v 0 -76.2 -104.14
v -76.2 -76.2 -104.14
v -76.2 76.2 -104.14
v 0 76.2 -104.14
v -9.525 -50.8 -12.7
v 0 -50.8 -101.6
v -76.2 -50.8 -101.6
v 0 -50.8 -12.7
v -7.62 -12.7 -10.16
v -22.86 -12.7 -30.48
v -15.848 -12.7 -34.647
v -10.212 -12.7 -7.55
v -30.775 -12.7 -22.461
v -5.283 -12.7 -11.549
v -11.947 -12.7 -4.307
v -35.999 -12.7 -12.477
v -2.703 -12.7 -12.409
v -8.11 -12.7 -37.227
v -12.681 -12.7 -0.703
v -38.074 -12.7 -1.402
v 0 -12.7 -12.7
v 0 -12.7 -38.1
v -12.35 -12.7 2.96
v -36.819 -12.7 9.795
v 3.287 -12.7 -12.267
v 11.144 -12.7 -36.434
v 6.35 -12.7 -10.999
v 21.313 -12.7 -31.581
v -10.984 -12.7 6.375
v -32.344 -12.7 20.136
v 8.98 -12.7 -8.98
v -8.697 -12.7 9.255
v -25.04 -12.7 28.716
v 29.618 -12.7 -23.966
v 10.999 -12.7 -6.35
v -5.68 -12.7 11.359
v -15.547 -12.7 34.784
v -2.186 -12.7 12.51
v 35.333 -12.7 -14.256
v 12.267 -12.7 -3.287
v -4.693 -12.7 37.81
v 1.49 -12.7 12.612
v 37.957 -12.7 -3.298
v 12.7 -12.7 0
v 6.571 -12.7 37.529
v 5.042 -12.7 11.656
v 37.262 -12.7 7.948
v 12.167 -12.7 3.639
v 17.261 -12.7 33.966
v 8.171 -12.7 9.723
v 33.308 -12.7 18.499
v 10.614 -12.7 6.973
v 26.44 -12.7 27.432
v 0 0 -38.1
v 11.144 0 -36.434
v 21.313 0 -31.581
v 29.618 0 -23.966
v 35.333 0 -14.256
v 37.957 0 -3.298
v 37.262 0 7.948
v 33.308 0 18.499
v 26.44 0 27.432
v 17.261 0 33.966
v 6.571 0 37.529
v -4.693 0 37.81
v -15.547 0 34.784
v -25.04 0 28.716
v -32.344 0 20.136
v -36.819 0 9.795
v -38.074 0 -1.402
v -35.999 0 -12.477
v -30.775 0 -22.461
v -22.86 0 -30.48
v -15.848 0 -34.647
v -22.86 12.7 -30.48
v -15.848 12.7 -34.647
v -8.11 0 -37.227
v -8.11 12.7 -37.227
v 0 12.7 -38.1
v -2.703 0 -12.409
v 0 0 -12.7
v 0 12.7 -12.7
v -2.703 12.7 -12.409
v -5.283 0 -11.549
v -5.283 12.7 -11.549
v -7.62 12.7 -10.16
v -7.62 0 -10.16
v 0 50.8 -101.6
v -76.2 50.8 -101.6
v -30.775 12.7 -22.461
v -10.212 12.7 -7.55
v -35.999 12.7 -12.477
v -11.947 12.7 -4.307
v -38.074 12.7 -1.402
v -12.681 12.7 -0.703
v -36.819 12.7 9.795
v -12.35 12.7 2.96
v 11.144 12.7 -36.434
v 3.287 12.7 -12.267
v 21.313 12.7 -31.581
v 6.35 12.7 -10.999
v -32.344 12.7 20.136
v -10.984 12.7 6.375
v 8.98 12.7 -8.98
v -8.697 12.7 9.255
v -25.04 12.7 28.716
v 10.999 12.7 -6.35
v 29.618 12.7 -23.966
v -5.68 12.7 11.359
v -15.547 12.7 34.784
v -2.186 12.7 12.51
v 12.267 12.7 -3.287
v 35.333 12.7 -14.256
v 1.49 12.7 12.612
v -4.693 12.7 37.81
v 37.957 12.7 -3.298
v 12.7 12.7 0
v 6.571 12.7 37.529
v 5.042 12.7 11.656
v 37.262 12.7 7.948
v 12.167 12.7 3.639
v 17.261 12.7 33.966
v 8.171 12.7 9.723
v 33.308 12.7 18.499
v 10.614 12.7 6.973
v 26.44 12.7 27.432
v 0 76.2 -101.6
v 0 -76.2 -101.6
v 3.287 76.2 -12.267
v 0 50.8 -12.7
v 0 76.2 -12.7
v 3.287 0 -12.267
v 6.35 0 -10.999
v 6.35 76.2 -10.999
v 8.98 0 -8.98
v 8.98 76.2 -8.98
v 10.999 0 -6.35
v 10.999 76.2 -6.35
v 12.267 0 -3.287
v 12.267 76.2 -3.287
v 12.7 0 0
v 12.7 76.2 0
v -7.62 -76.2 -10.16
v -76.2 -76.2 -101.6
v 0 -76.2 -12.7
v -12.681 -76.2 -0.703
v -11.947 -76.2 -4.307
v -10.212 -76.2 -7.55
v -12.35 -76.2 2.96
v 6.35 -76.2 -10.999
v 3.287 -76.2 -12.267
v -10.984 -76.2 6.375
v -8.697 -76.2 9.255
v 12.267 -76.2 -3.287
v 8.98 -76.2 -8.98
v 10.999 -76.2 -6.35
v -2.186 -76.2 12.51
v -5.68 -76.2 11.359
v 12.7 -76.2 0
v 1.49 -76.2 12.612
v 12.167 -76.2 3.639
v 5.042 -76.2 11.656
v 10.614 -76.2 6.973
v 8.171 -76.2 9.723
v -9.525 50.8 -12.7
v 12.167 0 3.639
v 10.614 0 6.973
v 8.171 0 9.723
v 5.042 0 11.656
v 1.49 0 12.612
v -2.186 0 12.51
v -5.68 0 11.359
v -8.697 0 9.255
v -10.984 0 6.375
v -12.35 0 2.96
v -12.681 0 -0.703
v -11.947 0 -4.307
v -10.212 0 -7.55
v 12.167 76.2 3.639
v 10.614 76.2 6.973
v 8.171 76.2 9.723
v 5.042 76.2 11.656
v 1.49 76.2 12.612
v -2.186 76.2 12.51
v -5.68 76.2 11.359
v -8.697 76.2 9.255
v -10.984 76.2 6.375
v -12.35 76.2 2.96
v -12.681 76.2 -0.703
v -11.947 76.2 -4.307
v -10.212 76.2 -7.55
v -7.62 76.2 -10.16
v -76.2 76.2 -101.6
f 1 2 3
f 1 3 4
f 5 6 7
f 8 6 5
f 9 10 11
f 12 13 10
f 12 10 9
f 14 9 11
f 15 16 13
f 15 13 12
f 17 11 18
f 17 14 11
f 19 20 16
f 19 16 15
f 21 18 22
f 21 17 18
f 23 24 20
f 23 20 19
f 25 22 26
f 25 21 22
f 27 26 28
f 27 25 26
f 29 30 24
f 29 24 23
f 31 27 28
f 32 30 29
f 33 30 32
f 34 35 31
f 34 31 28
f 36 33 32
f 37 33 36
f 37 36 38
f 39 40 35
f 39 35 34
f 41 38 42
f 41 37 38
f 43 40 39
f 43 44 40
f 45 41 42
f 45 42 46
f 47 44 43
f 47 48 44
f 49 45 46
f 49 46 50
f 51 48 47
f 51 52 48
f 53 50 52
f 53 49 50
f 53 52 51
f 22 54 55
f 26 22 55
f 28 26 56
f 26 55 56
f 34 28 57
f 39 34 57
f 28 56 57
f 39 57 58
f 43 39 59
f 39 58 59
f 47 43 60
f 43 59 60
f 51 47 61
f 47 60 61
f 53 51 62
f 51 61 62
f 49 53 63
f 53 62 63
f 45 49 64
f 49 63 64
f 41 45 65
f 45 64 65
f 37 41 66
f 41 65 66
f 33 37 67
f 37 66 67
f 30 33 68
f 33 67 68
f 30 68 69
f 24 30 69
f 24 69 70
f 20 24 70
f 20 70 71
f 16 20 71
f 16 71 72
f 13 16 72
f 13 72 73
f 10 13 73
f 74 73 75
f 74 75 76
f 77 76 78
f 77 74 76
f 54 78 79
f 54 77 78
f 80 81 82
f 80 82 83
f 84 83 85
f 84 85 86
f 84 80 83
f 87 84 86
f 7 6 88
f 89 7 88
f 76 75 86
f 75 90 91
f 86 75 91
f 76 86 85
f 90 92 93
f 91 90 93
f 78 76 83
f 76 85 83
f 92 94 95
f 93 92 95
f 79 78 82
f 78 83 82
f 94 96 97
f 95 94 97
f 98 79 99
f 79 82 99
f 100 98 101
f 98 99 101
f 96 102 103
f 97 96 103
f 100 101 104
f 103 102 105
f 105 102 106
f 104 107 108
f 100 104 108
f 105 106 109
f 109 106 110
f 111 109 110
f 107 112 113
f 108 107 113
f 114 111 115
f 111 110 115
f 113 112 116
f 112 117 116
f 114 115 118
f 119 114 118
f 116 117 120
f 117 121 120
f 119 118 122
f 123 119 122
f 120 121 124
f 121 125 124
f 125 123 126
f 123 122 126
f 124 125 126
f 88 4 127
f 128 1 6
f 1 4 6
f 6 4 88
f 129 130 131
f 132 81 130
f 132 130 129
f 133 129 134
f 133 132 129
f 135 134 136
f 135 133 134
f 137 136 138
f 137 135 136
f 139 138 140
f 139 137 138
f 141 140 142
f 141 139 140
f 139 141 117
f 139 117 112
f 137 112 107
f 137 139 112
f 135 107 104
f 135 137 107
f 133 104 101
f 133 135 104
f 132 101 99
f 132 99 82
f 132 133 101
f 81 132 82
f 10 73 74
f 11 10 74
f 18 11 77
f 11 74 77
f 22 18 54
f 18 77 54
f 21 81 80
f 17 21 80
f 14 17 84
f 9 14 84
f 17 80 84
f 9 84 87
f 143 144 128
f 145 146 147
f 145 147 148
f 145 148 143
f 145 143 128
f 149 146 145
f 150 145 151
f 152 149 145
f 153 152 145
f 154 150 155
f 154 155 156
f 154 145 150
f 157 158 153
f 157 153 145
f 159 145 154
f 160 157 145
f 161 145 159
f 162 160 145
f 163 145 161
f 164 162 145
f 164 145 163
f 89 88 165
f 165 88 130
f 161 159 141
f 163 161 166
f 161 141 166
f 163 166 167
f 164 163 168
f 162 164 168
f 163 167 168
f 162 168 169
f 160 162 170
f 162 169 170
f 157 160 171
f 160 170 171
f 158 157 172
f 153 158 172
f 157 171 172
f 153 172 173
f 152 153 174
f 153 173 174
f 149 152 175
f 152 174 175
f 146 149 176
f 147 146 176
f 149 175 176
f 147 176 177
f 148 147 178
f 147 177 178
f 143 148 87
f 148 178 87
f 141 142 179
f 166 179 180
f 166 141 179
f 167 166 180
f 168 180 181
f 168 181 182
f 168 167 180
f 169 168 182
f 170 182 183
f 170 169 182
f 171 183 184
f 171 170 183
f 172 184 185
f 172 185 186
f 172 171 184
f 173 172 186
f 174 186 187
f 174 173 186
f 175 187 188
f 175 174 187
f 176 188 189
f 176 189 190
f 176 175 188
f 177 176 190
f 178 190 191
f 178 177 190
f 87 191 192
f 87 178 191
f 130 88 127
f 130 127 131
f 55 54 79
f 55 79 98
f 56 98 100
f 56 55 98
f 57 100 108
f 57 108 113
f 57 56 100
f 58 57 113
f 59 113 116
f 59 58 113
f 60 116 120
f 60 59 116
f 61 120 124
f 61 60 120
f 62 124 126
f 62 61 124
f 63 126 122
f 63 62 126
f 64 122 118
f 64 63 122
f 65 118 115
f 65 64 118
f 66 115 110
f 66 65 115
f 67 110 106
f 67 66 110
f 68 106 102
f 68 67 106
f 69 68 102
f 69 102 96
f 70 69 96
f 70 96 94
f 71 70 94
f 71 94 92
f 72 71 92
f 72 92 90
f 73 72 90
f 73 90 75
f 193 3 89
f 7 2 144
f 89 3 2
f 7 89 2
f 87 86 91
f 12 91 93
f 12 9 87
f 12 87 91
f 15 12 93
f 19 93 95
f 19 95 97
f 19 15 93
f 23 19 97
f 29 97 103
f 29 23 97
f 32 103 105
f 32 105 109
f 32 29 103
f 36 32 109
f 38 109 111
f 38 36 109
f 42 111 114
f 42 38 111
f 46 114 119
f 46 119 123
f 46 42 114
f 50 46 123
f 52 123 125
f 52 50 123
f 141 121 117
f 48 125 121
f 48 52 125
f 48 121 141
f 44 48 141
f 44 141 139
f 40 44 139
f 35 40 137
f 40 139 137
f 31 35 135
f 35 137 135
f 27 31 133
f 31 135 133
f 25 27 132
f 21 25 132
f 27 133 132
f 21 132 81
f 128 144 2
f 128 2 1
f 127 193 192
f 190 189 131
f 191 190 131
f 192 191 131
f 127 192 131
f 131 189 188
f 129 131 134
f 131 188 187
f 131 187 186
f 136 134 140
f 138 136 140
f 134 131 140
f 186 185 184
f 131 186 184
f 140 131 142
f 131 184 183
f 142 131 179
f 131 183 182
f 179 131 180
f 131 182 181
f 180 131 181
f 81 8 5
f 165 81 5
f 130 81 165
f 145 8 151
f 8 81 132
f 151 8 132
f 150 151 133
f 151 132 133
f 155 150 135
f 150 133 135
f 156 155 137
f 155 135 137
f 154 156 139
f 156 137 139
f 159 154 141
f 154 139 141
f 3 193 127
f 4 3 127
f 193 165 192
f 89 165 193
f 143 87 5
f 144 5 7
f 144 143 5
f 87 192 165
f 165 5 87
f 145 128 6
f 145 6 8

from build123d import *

# Parameters (mm, degrees)
F0_W     = 76.2
F0_H     = 2.54
F1_DEPTH = 76.2
F2_DEPTH = 76.2
F3_W     = 101.6
F3_H     = 88.9
F4_DEPTH = 76.201
F5_DEPTH = 12.7


with BuildPart() as f1:
    # F0 (on Front) → F1 (new body, symmetric)
    with BuildSketch(Plane.XZ):
        with Locations((-38.1, -102.87)):
            Rectangle(F0_W, F0_H)
    extrude(amount=F1_DEPTH, both=True)

    # F0 (on Front) → F2 (join, symmetric)
    with BuildSketch(Plane.XZ):
        with BuildLine():
            ThreePointArc((0, -38.1), (-12.0482778852, -36.1448336557), (-22.86, -30.48))
            Line((-22.86, -30.48), (-76.2, -101.6))
            Line((-76.2, -101.6), (0, -101.6))
            Line((0, -101.6), (0, -38.1))
        make_face()
        with BuildLine():
            Line((-7.62, -10.16), (0, 0))
            Line((0, 0), (0, -12.7))
            ThreePointArc((0, -12.7), (8.9802561211, -8.9802561211), (12.7, 0))
            ThreePointArc((12.7, 0), (-5.6796126628, 11.3592253257), (-7.62, -10.16))
        make_face()
        with BuildLine():
            ThreePointArc((0, -12.7), (-4.0160926284, -12.0482778852), (-7.62, -10.16))
            Line((-7.62, -10.16), (-22.86, -30.48))
            ThreePointArc((-22.86, -30.48), (-12.0482778852, -36.1448336557), (0, -38.1))
            Line((0, -38.1), (0, -12.7))
        make_face()
        with BuildLine():
            Line((0, -12.7), (0, 0))
            Line((0, 0), (-7.62, -10.16))
            ThreePointArc((-7.62, -10.16), (-4.0160926284, -12.0482778852), (0, -12.7))
        make_face()
    extrude(amount=F2_DEPTH, both=True)

    # F3 (on face) → F4 (cut, through all)
    with BuildSketch(Plane.YZ):
        with Locations((0, -57.15)):
            Rectangle(F3_W, F3_H)
    extrude(amount=-F4_DEPTH, mode=Mode.SUBTRACT)


with BuildPart() as f5:
    # F0 (on Front) → F5 (new body, symmetric)
    with BuildSketch(Plane.XZ):
        with BuildLine():
            Line((-22.86, -30.48), (-7.62, -10.16))
            ThreePointArc((-7.62, -10.16), (-5.6796126628, 11.3592253257), (12.7, 0))
            ThreePointArc((12.7, 0), (8.9802561211, -8.9802561211), (0, -12.7))
            Line((0, -12.7), (0, -38.1))
            ThreePointArc((0, -38.1), (26.9407683632, -26.9407683632), (38.1, 0))
            ThreePointArc((38.1, 0), (-17.0388379885, 34.0776759771), (-22.86, -30.48))
        make_face()
        with BuildLine():
            ThreePointArc((0, -12.7), (-4.0160926284, -12.0482778852), (-7.62, -10.16))
            Line((-7.62, -10.16), (-22.86, -30.48))
            ThreePointArc((-22.86, -30.48), (-12.0482778852, -36.1448336557), (0, -38.1))
            Line((0, -38.1), (0, -12.7))
        make_face()
    extrude(amount=F5_DEPTH, both=True)


solid = Compound([f1.part, f5.part])
